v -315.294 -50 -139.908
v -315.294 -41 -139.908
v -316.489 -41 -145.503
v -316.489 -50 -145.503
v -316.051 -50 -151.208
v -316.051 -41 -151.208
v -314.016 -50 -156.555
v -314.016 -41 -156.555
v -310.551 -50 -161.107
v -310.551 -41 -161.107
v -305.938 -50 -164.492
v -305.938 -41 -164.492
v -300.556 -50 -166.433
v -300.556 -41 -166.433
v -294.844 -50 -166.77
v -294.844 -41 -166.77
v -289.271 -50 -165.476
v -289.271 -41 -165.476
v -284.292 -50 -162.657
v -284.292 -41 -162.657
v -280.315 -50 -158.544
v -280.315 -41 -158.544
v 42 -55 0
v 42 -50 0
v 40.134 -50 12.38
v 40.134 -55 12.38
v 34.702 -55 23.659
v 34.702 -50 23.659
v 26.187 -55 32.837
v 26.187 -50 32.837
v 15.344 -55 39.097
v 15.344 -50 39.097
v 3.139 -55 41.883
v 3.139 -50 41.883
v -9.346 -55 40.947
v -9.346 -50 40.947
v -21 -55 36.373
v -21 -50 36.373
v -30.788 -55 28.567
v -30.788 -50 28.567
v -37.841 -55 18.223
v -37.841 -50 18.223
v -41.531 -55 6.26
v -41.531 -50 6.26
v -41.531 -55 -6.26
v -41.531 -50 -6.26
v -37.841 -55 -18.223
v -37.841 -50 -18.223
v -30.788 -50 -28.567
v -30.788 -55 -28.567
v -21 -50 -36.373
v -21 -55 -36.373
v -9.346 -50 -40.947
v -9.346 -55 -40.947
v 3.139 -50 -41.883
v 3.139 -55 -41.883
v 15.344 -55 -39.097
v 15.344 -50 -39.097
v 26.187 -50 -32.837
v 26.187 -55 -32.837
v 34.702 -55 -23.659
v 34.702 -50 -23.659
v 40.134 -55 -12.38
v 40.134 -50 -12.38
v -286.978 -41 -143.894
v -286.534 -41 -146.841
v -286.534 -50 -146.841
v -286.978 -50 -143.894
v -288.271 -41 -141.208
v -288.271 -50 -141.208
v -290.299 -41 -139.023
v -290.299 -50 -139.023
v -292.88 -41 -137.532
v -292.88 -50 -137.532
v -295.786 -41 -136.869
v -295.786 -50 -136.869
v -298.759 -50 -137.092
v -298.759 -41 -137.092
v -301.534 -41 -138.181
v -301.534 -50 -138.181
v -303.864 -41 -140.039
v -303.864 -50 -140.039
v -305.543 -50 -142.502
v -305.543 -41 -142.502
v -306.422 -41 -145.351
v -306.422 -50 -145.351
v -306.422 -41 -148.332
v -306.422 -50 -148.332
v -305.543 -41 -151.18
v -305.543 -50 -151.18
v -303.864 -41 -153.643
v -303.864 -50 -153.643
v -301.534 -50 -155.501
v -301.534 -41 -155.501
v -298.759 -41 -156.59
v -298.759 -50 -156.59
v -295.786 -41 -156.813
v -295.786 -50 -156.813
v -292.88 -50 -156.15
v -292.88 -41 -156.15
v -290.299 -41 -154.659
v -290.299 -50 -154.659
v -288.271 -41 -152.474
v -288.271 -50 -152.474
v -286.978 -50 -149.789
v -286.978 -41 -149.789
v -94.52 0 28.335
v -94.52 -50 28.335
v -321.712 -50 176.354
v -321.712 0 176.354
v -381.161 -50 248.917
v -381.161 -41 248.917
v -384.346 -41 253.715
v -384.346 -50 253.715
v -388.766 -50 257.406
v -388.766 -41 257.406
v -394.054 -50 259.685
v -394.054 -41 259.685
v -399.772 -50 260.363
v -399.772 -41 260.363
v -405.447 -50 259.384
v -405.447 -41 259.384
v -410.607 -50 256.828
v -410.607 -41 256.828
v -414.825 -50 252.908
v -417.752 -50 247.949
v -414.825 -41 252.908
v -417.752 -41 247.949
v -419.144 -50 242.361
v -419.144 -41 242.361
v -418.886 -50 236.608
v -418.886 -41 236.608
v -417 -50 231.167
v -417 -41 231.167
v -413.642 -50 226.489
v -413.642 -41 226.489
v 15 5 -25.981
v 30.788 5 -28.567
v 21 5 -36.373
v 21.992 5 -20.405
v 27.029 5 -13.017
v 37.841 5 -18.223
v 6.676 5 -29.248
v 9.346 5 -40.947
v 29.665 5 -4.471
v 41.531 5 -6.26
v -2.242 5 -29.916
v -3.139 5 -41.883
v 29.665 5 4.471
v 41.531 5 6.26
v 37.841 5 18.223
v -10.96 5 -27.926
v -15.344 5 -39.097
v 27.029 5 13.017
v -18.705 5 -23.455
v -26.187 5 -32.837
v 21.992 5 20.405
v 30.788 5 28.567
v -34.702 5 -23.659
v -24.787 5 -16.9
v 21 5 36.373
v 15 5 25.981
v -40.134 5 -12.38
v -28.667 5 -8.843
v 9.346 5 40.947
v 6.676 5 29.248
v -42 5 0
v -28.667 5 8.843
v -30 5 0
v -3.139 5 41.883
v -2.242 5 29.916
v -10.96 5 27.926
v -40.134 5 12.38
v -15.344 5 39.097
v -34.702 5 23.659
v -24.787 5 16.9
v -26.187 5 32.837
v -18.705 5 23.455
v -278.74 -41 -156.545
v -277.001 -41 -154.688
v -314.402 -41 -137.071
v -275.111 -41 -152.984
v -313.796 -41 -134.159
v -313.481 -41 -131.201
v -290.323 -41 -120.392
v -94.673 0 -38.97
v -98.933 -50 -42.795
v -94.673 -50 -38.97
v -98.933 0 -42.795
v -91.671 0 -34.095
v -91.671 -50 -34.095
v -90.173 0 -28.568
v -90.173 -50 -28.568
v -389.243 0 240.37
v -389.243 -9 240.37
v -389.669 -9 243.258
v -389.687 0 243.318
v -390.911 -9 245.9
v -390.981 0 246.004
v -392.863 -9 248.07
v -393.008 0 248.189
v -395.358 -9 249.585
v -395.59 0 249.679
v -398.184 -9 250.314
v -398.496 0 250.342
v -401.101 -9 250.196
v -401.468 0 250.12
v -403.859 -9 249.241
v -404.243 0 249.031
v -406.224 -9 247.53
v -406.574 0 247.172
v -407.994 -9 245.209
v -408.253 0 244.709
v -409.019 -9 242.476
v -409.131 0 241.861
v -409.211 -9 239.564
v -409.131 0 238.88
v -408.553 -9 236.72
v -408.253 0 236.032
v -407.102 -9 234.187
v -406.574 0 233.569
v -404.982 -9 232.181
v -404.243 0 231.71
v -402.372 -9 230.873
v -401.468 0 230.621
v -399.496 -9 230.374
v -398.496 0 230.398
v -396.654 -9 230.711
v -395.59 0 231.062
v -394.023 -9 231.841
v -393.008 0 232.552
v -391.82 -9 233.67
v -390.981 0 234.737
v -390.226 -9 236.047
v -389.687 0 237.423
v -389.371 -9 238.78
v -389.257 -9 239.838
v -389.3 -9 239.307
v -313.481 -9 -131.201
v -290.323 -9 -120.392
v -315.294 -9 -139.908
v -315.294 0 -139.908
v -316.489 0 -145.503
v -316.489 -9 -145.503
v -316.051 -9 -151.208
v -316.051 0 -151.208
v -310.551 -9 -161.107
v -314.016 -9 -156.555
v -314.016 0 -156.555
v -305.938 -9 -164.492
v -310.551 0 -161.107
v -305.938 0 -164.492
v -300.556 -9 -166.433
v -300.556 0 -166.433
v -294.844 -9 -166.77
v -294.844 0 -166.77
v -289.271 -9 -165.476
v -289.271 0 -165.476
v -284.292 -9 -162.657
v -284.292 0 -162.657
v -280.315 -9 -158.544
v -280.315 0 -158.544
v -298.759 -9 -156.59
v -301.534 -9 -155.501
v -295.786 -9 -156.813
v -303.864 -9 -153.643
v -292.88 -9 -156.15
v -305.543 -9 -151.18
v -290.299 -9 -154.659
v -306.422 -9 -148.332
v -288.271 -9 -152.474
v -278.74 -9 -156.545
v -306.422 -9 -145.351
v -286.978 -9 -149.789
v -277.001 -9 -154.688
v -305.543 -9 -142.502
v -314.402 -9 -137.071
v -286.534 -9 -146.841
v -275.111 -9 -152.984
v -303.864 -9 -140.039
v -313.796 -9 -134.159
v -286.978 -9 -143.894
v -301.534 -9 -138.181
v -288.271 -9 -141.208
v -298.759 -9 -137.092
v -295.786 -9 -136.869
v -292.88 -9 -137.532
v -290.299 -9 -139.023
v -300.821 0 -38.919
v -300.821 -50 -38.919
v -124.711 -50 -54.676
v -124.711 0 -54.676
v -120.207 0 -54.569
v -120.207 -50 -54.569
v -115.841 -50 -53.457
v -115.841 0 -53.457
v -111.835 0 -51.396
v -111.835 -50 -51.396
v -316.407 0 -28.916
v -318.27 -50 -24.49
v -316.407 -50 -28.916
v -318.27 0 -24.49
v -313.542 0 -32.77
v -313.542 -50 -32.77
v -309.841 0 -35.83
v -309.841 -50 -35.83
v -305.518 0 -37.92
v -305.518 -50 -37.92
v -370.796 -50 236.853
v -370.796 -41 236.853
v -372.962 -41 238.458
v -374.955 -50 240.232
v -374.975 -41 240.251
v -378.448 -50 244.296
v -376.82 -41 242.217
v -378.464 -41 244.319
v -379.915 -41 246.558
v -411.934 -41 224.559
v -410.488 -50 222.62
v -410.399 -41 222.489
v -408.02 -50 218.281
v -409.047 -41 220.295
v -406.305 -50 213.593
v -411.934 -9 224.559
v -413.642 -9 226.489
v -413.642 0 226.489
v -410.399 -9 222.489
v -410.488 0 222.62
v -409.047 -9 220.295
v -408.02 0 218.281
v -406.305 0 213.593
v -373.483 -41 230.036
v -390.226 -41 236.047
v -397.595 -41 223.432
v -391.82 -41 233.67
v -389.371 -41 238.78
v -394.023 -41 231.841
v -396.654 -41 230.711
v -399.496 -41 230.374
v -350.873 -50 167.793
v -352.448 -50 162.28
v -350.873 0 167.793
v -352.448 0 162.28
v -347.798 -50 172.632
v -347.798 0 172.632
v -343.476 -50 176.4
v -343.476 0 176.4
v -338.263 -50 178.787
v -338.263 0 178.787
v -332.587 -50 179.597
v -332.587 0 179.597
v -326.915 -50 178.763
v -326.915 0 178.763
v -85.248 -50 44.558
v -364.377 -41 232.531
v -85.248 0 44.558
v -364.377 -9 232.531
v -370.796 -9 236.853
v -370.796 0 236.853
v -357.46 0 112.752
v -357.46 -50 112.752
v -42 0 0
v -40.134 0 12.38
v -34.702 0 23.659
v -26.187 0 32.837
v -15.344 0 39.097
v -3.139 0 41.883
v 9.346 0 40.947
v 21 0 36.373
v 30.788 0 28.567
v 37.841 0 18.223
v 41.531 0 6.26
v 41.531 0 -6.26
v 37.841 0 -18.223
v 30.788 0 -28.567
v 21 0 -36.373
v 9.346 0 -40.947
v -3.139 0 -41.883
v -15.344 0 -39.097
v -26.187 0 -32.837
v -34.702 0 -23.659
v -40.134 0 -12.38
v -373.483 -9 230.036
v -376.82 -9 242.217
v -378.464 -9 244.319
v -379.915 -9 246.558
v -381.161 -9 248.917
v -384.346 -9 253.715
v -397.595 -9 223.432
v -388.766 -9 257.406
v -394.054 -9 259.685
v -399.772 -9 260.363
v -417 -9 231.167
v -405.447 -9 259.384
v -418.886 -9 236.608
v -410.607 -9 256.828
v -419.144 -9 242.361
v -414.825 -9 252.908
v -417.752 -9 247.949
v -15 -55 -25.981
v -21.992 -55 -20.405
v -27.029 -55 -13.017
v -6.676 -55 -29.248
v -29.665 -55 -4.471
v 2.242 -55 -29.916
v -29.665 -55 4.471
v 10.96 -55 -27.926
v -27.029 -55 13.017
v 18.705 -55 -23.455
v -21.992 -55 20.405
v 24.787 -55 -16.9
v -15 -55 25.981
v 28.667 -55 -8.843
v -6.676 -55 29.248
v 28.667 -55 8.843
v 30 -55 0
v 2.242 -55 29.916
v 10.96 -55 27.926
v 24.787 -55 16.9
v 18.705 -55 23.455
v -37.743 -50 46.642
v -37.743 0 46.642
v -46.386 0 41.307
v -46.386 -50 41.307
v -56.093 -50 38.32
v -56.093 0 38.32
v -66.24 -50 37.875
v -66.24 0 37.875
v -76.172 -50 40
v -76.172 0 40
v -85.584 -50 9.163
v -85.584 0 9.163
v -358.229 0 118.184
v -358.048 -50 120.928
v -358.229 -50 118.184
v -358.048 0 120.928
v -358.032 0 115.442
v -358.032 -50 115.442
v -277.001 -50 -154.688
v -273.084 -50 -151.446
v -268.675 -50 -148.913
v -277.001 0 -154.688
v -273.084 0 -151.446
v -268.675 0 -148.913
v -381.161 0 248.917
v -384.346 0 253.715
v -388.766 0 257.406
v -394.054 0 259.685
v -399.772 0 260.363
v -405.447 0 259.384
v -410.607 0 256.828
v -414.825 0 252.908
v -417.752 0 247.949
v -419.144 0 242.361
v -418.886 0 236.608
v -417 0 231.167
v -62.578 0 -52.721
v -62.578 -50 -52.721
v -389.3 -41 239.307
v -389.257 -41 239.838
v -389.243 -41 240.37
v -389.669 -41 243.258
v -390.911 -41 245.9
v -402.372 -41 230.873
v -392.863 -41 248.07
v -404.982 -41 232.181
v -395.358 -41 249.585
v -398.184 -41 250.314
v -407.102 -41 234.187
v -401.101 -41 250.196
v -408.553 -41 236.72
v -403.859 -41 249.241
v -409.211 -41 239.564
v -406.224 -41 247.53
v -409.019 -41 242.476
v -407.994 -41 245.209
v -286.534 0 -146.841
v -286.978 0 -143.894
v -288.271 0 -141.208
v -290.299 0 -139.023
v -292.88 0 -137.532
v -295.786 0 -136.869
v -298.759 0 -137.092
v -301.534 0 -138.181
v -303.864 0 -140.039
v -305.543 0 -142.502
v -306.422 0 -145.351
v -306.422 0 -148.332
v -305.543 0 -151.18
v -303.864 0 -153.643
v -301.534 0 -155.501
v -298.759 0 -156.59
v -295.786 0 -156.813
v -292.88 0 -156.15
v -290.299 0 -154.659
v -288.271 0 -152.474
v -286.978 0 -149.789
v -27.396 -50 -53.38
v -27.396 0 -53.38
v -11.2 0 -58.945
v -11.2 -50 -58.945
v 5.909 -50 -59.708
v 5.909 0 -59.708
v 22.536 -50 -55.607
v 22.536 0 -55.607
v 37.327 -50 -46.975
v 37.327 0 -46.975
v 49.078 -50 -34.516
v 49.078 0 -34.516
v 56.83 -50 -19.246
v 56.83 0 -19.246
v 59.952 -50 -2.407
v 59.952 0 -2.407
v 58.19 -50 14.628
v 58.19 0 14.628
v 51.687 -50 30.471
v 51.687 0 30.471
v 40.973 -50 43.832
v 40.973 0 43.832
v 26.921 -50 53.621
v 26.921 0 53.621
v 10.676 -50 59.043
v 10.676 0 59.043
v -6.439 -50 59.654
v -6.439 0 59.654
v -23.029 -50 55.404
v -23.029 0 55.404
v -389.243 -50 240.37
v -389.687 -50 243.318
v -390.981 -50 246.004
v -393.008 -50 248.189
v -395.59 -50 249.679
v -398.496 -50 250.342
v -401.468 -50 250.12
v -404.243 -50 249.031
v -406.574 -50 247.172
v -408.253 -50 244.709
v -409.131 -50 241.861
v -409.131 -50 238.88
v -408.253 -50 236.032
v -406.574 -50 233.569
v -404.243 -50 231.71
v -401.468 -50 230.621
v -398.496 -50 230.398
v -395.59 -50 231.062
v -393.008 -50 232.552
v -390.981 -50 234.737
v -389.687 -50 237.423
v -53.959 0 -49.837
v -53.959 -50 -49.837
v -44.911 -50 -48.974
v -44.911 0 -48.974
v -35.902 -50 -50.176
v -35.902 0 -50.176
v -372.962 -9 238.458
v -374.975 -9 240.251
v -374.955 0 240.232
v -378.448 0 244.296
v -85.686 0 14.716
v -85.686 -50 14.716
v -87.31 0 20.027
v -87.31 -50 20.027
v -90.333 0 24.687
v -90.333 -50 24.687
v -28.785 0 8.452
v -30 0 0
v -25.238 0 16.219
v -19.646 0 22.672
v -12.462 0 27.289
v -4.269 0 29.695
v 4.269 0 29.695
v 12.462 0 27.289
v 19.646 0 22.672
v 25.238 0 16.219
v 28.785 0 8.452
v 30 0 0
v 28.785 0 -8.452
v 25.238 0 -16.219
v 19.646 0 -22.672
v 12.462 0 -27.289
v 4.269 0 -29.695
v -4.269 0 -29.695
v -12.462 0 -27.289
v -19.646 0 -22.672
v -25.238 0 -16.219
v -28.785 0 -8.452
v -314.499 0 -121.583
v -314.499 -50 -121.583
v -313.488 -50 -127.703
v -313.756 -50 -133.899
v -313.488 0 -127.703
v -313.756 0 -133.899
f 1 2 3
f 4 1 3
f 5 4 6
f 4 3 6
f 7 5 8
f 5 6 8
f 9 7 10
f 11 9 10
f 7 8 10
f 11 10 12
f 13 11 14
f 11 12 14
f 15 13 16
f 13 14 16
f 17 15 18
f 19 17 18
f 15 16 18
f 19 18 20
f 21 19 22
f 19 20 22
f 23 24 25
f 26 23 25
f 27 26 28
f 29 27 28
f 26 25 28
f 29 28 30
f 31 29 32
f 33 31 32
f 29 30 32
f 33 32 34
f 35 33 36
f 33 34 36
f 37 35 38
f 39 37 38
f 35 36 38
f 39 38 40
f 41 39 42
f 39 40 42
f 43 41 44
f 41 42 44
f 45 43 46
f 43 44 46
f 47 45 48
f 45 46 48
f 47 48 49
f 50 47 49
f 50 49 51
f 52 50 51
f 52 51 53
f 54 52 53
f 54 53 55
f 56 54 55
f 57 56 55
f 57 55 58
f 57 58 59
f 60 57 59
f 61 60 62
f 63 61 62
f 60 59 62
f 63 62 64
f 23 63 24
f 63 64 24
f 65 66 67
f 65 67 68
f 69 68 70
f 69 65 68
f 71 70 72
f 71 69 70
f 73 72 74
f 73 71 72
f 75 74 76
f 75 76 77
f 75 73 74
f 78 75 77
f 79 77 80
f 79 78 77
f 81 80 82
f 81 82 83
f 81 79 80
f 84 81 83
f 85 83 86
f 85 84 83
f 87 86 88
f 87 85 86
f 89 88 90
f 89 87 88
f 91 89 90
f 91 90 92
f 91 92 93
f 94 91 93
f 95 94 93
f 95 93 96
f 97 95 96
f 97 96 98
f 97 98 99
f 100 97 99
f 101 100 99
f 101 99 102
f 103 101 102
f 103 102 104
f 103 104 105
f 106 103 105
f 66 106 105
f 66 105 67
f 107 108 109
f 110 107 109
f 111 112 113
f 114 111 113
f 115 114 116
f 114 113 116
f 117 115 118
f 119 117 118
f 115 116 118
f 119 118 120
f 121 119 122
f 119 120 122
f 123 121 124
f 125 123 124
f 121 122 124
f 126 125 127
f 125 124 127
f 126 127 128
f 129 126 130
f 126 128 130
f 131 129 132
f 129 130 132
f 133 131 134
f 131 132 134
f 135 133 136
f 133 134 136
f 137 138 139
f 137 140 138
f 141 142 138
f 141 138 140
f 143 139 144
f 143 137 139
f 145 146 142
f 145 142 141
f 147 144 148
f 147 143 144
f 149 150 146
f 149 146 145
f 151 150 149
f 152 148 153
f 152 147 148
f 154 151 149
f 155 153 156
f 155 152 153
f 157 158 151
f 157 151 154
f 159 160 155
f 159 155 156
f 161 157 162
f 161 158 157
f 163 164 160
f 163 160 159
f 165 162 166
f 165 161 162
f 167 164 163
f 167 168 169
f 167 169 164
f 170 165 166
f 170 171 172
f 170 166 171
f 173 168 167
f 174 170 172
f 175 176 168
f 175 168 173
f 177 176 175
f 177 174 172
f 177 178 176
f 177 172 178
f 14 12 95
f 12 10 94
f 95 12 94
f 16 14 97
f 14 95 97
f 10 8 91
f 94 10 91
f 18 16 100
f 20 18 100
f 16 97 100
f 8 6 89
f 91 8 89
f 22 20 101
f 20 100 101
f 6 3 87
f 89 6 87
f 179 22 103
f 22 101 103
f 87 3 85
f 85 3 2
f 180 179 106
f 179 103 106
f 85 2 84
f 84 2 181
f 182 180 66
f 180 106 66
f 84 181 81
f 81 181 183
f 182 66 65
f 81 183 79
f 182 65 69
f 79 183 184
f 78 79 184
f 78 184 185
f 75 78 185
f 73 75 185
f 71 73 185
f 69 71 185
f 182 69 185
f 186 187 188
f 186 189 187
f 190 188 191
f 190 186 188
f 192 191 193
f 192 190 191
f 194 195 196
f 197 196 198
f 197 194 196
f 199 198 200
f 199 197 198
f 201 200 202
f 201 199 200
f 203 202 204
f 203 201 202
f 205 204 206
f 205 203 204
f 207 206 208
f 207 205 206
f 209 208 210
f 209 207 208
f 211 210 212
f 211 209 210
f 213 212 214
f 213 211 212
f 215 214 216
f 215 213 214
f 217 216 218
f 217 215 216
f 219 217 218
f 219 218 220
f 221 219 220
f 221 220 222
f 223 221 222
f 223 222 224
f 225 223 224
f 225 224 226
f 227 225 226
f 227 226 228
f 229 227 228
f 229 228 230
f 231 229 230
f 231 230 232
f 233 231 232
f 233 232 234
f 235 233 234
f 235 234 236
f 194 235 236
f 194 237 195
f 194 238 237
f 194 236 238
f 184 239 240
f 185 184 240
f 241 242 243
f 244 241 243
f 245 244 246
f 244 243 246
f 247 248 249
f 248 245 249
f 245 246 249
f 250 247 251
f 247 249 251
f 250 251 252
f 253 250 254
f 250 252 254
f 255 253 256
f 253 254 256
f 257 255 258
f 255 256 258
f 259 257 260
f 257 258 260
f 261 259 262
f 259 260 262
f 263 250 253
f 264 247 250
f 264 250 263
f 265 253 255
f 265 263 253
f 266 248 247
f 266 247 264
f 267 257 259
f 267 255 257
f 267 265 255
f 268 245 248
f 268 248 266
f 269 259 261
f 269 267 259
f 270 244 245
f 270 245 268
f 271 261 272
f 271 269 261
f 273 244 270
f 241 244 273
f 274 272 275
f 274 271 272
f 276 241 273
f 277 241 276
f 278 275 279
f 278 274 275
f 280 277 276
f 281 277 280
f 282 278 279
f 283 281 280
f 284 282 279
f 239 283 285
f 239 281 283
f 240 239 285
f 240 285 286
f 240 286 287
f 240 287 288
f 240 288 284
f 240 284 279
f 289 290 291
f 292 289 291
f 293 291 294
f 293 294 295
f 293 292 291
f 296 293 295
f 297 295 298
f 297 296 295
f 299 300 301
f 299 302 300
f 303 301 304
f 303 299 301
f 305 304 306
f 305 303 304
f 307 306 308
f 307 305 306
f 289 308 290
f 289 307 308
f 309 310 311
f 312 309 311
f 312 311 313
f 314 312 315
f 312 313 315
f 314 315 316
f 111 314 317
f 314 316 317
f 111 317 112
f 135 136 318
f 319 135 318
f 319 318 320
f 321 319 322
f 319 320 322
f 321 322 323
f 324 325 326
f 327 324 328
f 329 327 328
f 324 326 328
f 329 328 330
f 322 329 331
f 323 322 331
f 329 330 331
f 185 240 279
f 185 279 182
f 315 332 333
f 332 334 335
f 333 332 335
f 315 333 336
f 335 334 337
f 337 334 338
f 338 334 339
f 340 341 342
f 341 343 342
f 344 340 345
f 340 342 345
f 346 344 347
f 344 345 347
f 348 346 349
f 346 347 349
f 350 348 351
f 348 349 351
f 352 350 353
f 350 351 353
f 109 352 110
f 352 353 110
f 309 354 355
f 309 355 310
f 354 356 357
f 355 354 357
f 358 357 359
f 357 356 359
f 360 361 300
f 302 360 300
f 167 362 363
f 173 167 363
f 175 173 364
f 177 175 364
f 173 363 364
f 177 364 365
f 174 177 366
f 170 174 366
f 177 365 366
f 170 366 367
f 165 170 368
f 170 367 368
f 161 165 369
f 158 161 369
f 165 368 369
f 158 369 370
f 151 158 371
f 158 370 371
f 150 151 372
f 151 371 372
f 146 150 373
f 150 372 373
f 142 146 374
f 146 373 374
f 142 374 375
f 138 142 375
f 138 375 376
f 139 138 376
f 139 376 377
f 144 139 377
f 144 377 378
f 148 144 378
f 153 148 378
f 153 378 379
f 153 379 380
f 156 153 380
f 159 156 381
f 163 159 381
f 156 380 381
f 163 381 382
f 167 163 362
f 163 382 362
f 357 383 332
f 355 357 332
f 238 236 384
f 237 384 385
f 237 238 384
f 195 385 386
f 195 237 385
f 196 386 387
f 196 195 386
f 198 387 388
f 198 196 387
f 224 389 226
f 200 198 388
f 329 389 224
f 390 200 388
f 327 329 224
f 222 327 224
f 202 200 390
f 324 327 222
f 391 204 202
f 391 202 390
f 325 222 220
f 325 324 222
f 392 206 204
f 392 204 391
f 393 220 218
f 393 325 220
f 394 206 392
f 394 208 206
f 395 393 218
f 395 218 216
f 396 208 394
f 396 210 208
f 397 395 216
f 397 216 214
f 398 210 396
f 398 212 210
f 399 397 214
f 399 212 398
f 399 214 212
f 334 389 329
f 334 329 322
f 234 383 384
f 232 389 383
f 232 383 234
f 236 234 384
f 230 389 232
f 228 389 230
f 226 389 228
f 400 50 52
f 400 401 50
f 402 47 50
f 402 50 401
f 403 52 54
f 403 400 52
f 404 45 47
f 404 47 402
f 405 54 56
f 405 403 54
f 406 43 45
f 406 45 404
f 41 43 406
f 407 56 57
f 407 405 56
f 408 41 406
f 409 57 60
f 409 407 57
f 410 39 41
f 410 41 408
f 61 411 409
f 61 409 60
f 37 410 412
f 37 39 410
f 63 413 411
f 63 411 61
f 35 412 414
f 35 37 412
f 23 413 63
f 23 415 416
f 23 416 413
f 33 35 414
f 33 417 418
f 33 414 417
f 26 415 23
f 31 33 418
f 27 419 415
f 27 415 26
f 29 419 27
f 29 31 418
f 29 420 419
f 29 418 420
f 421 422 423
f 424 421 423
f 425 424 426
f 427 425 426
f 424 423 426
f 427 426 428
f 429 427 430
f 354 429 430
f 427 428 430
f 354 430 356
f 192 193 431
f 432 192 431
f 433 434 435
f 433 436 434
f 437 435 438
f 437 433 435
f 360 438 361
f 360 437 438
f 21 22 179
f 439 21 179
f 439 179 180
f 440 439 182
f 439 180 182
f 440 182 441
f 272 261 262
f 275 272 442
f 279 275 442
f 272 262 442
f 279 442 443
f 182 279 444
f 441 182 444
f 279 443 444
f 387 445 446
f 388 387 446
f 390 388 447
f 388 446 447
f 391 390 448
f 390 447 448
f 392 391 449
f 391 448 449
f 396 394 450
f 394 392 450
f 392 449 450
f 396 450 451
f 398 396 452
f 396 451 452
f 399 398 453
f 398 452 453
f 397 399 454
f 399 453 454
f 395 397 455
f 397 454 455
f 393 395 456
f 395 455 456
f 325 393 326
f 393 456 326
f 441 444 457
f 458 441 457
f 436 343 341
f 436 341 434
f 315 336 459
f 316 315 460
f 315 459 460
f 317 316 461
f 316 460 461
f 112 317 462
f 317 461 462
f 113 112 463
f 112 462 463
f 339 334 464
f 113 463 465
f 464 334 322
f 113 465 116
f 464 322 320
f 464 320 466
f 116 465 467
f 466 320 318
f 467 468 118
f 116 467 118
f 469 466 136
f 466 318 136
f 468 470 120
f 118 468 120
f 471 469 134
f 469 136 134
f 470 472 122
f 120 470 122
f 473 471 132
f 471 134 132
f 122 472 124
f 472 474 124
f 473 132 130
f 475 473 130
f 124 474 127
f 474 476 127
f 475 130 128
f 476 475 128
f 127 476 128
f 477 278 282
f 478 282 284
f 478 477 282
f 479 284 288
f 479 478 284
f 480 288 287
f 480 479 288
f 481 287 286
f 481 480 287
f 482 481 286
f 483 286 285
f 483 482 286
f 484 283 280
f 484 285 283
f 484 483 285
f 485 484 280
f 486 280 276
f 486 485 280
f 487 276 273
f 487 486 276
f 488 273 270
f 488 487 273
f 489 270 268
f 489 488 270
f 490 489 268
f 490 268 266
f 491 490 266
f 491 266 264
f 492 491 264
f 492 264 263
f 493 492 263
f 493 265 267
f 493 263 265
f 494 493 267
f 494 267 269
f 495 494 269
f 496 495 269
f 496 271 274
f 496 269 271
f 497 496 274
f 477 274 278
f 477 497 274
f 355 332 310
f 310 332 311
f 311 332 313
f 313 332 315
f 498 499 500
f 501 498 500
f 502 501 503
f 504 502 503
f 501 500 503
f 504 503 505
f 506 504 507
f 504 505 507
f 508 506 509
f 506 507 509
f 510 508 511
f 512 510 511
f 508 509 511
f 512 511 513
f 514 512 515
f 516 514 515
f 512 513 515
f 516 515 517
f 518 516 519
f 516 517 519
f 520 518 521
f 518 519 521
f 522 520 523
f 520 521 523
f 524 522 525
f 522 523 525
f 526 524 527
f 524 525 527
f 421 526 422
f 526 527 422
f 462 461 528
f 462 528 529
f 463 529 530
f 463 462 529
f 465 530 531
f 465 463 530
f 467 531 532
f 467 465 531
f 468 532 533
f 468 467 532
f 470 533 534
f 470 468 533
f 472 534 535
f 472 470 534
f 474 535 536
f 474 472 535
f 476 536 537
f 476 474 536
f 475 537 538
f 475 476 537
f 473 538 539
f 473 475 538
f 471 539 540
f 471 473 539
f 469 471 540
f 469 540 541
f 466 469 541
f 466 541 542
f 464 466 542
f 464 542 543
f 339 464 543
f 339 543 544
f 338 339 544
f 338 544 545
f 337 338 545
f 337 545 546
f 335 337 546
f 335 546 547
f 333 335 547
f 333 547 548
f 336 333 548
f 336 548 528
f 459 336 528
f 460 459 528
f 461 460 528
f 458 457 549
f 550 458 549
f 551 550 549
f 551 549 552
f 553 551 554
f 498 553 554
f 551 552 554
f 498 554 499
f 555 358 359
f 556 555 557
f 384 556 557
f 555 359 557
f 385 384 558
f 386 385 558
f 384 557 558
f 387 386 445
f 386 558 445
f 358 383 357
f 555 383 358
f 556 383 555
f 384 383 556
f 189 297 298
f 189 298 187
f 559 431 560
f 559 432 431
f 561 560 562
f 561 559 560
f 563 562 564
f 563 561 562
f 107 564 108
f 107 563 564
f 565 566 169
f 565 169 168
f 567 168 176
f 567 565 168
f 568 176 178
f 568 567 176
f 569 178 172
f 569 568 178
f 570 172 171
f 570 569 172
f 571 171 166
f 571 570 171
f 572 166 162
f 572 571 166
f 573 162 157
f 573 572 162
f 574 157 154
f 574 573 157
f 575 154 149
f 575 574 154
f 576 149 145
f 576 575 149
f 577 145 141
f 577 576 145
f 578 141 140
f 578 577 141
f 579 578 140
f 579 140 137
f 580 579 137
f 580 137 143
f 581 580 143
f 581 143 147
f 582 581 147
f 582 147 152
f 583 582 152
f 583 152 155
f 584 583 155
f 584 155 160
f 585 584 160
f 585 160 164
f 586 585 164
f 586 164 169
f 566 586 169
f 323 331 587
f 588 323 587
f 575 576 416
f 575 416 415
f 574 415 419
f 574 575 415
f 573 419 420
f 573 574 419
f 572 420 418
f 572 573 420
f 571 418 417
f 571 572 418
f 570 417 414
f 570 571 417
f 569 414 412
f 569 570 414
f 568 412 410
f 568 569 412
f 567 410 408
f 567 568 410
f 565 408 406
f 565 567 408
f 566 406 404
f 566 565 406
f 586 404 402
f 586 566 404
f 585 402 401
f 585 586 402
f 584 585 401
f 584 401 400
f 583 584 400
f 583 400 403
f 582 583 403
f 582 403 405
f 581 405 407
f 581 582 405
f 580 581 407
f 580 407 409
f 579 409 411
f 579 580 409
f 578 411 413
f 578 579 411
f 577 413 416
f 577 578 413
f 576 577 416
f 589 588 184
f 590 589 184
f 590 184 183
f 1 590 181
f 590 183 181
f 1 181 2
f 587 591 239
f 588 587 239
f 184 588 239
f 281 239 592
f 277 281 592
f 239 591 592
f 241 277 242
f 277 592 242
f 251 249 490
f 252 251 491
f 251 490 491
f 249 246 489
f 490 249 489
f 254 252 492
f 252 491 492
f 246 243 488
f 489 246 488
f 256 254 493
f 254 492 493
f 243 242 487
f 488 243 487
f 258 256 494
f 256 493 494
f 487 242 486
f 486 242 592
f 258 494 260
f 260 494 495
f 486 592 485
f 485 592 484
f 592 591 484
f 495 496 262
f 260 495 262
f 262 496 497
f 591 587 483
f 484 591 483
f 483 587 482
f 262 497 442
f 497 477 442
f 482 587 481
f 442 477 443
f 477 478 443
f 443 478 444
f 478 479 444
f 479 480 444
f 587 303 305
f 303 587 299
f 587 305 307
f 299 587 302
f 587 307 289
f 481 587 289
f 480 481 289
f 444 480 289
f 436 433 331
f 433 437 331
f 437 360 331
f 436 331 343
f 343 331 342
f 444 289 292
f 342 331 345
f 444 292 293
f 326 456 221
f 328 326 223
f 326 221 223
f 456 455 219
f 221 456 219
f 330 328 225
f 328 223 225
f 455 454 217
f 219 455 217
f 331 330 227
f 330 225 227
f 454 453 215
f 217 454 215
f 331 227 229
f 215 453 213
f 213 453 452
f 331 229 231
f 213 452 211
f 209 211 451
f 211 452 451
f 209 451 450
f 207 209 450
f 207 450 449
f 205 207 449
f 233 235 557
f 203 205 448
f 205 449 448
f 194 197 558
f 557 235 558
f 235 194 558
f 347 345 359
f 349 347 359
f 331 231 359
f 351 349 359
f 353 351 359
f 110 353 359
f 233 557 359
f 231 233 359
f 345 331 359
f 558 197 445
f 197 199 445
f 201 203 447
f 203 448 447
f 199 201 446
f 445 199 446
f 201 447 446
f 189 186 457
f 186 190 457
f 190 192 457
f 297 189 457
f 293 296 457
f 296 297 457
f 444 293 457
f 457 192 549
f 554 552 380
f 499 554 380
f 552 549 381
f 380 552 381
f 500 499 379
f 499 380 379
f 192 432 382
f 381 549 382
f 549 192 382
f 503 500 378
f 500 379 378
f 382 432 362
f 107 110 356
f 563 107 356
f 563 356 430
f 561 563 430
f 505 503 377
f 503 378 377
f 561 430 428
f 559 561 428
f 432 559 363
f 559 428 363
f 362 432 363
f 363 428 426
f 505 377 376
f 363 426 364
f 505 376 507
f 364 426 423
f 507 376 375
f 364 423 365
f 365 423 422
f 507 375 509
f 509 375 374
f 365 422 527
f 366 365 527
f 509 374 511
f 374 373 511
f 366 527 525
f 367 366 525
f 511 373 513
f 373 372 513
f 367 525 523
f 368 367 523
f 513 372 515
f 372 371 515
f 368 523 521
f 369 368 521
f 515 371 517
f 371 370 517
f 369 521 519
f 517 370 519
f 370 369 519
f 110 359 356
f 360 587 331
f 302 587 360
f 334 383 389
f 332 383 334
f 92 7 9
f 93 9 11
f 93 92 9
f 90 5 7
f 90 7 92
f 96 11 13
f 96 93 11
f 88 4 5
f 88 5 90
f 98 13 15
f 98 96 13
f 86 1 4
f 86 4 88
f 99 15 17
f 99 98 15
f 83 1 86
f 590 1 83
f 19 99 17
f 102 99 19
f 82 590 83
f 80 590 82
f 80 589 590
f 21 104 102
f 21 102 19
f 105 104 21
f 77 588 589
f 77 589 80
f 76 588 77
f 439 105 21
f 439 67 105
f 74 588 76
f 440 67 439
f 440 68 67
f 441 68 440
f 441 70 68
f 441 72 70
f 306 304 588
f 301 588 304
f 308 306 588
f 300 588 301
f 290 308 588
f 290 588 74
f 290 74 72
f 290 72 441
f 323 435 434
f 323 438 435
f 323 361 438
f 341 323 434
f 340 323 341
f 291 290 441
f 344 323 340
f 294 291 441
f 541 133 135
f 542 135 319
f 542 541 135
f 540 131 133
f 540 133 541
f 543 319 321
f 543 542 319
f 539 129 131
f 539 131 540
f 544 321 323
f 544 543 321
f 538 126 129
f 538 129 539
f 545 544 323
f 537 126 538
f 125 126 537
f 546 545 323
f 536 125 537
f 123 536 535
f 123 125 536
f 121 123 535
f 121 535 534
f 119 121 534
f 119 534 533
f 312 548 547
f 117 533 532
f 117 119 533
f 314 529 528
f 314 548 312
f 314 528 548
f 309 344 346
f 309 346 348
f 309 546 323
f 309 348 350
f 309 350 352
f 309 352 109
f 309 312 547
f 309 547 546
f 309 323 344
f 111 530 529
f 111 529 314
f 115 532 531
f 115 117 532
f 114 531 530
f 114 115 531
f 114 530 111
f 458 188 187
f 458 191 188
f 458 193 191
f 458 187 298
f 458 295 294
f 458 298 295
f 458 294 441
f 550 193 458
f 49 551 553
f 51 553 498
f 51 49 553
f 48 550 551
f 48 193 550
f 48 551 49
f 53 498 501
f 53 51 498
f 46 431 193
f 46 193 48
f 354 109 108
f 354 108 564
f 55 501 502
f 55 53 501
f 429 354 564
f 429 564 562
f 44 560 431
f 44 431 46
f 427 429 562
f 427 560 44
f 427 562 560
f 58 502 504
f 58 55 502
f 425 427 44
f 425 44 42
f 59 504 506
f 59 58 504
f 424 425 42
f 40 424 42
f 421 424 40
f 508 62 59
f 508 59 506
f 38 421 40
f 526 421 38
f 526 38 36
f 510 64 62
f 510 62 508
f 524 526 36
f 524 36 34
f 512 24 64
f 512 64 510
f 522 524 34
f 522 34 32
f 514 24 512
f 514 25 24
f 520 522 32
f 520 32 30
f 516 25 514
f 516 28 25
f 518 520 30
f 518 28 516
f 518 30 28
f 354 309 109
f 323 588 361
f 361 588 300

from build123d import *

# Parameters (mm, degrees)
F0_R           = 10
F0_R_2         = 30
F1_DEPTH       = 50
F3_W           = 32
F3_H           = 46.9773098714
F4_DEPTH       = 36
F4_DEPTH_BACK  = 36
F7_W           = 64.344675952
F7_H           = 32
F8_DEPTH       = 35
F8_DEPTH_BACK  = 25
F10_DEPTH      = 100
F11_R          = 20
F12_R          = 42
F12_R_2        = 30
F13_DEPTH      = 5
F14_R          = 42
F14_R_2        = 30
F15_DEPTH      = 5
F16_W          = 32
F16_H          = 12.6297663026
F17_DEPTH      = 25
F17_DEPTH_BACK = 25


# Not quite as in the source:
# - a feature names something its author has since deleted; it is built from what else it names


with BuildPart() as f1:
    # F0 (on Front) → F1 (new body)
    with BuildSketch(Plane.XZ):
        with BuildLine():
            ThreePointArc((-62.5780437897, -52.7205259787), (-44.9107725801, -48.9739327439), (-27.3963571385, -53.3801425208))
            ThreePointArc((-27.3963571385, -53.3801425208), (59.6815194776, 6.173834533), (-37.7432491465, 46.6416889045))
            ThreePointArc((-37.7432491465, 46.6416889045), (-61.1526251037, 37.7745700431), (-85.2484645361, 44.5580206149))
            Line((-85.2484645361, 44.5580206149), (-370.7956962097, 236.8532567171))
            ThreePointArc((-370.7956962097, 236.8532567171), (-376.7925336048, 242.1856420807), (-381.1612781983, 248.9169467897))
            ThreePointArc((-381.1612781983, 248.9169467897), (-410.6071858154, 256.8281563435), (-413.6417851947, 226.4894035906))
            ThreePointArc((-413.6417851947, 226.4894035906), (-409.1637807856, 220.5019975774), (-406.3054242786, 213.5932095263))
            Line((-406.3054242786, 213.5932095263), (-314.4991596079, -121.5832610972))
            ThreePointArc((-314.4991596079, -121.5832610972), (-313.4615655347, -130.8078667851), (-315.293607643, -139.9080631166))
            ThreePointArc((-315.293607643, -139.9080631166), (-305.9378740774, -164.4922463623), (-280.3150583777, -158.5438741459))
            ThreePointArc((-280.3150583777, -158.5438741459), (-275.1112486364, -152.9838392789), (-268.6751253171, -148.913220141))
            Line((-268.6751253171, -148.913220141), (-62.5780437897, -52.7205259787))
        make_face()
        with Locations((-296.5337380309, -146.8411210378)):
            Circle(F0_R, mode=Mode.SUBTRACT)
        Circle(F0_R_2, mode=Mode.SUBTRACT)
        with Locations((-399.2431908367, 240.3703430585)):
            Circle(F0_R, mode=Mode.SUBTRACT)
    extrude(amount=F1_DEPTH)

    # F3 (on face) → F4 (cut, two sides)
    with BuildSketch(Plane(origin=(-323.5290376394, 0, -88.6159831057), x_dir=(0, -1, 0), z_dir=(-0.9644750818, 0, -0.2641738379))) as f4_sk:
        with Locations((25, 344.0173126814)):
            Rectangle(F3_W, F3_H)
    extrude(amount=F4_DEPTH, mode=Mode.SUBTRACT)
    extrude(f4_sk.sketch, amount=-F4_DEPTH_BACK, mode=Mode.SUBTRACT)

    # F7 (on offset) → F8 (cut, two sides)
    with BuildSketch(Plane(origin=(9.0113675019, 0, -19.3072515422), x_dir=(0.9061594556, 0, 0.422936214), z_dir=(0.422936214, 0, -0.9061594556))) as f8_sk:
        with Locations((-346.1694030438, 25)):
            Rectangle(F7_W, F7_H)
    extrude(amount=-F8_DEPTH, mode=Mode.SUBTRACT)
    extrude(f8_sk.sketch, amount=F8_DEPTH_BACK, mode=Mode.SUBTRACT)

    # F9 (on face) → F10 (cut)
    with BuildSketch(Plane.XZ.offset(50)):
        Polygon((-348.2052087784, 193.6148256063), (-358.6101531982, 116.7783439159), (-314.4991596079, -37.6950278878), (-117.6957413554, -55.3033873439), (-91.2832021713, -37.6950278878), (-84.079772234, 21.5331036597), align=None)
    extrude(amount=-F10_DEPTH, mode=Mode.SUBTRACT)

    # F11
    f11_edges = [f1.edges().sort_by_distance(p)[0] for p in [
        (-348.205209, -25, 193.614826),
        (-358.610153, -25, 116.778344),
        (-84.079772, -25, 21.533104),
        (-91.283202, -25, -37.695028),
        (-117.695741, -25, -55.303387),
        (-314.49916, -25, -37.695028),
    ]]
    fillet(f11_edges, radius=F11_R)

    # F12 (on face) → F13 (join)
    with BuildSketch(Plane.XZ.offset(50)):
        Circle(F12_R)
        Circle(F12_R_2, mode=Mode.SUBTRACT)
    extrude(amount=F13_DEPTH)

    # F14 (on face) → F15 (join)
    with BuildSketch(Plane(origin=(0, 0, 0), x_dir=(-1, 0, 0), z_dir=(0, 1, 0))):
        Circle(F14_R)
        Circle(F14_R_2, mode=Mode.SUBTRACT)
    extrude(amount=F15_DEPTH)

    # F16 (on face) → F17 (cut, two sides)
    with BuildSketch(Plane(origin=(-288.8079346956, 0, -79.1057249405), x_dir=(0, -1, 0), z_dir=(-0.9644750818, 0, -0.2641738379))) as f17_sk:
        with Locations((25, 326.843540897)):
            Rectangle(F16_W, F16_H)
    extrude(amount=F17_DEPTH, mode=Mode.SUBTRACT)
    extrude(f17_sk.sketch, amount=-F17_DEPTH_BACK, mode=Mode.SUBTRACT)


solid = f1.part
